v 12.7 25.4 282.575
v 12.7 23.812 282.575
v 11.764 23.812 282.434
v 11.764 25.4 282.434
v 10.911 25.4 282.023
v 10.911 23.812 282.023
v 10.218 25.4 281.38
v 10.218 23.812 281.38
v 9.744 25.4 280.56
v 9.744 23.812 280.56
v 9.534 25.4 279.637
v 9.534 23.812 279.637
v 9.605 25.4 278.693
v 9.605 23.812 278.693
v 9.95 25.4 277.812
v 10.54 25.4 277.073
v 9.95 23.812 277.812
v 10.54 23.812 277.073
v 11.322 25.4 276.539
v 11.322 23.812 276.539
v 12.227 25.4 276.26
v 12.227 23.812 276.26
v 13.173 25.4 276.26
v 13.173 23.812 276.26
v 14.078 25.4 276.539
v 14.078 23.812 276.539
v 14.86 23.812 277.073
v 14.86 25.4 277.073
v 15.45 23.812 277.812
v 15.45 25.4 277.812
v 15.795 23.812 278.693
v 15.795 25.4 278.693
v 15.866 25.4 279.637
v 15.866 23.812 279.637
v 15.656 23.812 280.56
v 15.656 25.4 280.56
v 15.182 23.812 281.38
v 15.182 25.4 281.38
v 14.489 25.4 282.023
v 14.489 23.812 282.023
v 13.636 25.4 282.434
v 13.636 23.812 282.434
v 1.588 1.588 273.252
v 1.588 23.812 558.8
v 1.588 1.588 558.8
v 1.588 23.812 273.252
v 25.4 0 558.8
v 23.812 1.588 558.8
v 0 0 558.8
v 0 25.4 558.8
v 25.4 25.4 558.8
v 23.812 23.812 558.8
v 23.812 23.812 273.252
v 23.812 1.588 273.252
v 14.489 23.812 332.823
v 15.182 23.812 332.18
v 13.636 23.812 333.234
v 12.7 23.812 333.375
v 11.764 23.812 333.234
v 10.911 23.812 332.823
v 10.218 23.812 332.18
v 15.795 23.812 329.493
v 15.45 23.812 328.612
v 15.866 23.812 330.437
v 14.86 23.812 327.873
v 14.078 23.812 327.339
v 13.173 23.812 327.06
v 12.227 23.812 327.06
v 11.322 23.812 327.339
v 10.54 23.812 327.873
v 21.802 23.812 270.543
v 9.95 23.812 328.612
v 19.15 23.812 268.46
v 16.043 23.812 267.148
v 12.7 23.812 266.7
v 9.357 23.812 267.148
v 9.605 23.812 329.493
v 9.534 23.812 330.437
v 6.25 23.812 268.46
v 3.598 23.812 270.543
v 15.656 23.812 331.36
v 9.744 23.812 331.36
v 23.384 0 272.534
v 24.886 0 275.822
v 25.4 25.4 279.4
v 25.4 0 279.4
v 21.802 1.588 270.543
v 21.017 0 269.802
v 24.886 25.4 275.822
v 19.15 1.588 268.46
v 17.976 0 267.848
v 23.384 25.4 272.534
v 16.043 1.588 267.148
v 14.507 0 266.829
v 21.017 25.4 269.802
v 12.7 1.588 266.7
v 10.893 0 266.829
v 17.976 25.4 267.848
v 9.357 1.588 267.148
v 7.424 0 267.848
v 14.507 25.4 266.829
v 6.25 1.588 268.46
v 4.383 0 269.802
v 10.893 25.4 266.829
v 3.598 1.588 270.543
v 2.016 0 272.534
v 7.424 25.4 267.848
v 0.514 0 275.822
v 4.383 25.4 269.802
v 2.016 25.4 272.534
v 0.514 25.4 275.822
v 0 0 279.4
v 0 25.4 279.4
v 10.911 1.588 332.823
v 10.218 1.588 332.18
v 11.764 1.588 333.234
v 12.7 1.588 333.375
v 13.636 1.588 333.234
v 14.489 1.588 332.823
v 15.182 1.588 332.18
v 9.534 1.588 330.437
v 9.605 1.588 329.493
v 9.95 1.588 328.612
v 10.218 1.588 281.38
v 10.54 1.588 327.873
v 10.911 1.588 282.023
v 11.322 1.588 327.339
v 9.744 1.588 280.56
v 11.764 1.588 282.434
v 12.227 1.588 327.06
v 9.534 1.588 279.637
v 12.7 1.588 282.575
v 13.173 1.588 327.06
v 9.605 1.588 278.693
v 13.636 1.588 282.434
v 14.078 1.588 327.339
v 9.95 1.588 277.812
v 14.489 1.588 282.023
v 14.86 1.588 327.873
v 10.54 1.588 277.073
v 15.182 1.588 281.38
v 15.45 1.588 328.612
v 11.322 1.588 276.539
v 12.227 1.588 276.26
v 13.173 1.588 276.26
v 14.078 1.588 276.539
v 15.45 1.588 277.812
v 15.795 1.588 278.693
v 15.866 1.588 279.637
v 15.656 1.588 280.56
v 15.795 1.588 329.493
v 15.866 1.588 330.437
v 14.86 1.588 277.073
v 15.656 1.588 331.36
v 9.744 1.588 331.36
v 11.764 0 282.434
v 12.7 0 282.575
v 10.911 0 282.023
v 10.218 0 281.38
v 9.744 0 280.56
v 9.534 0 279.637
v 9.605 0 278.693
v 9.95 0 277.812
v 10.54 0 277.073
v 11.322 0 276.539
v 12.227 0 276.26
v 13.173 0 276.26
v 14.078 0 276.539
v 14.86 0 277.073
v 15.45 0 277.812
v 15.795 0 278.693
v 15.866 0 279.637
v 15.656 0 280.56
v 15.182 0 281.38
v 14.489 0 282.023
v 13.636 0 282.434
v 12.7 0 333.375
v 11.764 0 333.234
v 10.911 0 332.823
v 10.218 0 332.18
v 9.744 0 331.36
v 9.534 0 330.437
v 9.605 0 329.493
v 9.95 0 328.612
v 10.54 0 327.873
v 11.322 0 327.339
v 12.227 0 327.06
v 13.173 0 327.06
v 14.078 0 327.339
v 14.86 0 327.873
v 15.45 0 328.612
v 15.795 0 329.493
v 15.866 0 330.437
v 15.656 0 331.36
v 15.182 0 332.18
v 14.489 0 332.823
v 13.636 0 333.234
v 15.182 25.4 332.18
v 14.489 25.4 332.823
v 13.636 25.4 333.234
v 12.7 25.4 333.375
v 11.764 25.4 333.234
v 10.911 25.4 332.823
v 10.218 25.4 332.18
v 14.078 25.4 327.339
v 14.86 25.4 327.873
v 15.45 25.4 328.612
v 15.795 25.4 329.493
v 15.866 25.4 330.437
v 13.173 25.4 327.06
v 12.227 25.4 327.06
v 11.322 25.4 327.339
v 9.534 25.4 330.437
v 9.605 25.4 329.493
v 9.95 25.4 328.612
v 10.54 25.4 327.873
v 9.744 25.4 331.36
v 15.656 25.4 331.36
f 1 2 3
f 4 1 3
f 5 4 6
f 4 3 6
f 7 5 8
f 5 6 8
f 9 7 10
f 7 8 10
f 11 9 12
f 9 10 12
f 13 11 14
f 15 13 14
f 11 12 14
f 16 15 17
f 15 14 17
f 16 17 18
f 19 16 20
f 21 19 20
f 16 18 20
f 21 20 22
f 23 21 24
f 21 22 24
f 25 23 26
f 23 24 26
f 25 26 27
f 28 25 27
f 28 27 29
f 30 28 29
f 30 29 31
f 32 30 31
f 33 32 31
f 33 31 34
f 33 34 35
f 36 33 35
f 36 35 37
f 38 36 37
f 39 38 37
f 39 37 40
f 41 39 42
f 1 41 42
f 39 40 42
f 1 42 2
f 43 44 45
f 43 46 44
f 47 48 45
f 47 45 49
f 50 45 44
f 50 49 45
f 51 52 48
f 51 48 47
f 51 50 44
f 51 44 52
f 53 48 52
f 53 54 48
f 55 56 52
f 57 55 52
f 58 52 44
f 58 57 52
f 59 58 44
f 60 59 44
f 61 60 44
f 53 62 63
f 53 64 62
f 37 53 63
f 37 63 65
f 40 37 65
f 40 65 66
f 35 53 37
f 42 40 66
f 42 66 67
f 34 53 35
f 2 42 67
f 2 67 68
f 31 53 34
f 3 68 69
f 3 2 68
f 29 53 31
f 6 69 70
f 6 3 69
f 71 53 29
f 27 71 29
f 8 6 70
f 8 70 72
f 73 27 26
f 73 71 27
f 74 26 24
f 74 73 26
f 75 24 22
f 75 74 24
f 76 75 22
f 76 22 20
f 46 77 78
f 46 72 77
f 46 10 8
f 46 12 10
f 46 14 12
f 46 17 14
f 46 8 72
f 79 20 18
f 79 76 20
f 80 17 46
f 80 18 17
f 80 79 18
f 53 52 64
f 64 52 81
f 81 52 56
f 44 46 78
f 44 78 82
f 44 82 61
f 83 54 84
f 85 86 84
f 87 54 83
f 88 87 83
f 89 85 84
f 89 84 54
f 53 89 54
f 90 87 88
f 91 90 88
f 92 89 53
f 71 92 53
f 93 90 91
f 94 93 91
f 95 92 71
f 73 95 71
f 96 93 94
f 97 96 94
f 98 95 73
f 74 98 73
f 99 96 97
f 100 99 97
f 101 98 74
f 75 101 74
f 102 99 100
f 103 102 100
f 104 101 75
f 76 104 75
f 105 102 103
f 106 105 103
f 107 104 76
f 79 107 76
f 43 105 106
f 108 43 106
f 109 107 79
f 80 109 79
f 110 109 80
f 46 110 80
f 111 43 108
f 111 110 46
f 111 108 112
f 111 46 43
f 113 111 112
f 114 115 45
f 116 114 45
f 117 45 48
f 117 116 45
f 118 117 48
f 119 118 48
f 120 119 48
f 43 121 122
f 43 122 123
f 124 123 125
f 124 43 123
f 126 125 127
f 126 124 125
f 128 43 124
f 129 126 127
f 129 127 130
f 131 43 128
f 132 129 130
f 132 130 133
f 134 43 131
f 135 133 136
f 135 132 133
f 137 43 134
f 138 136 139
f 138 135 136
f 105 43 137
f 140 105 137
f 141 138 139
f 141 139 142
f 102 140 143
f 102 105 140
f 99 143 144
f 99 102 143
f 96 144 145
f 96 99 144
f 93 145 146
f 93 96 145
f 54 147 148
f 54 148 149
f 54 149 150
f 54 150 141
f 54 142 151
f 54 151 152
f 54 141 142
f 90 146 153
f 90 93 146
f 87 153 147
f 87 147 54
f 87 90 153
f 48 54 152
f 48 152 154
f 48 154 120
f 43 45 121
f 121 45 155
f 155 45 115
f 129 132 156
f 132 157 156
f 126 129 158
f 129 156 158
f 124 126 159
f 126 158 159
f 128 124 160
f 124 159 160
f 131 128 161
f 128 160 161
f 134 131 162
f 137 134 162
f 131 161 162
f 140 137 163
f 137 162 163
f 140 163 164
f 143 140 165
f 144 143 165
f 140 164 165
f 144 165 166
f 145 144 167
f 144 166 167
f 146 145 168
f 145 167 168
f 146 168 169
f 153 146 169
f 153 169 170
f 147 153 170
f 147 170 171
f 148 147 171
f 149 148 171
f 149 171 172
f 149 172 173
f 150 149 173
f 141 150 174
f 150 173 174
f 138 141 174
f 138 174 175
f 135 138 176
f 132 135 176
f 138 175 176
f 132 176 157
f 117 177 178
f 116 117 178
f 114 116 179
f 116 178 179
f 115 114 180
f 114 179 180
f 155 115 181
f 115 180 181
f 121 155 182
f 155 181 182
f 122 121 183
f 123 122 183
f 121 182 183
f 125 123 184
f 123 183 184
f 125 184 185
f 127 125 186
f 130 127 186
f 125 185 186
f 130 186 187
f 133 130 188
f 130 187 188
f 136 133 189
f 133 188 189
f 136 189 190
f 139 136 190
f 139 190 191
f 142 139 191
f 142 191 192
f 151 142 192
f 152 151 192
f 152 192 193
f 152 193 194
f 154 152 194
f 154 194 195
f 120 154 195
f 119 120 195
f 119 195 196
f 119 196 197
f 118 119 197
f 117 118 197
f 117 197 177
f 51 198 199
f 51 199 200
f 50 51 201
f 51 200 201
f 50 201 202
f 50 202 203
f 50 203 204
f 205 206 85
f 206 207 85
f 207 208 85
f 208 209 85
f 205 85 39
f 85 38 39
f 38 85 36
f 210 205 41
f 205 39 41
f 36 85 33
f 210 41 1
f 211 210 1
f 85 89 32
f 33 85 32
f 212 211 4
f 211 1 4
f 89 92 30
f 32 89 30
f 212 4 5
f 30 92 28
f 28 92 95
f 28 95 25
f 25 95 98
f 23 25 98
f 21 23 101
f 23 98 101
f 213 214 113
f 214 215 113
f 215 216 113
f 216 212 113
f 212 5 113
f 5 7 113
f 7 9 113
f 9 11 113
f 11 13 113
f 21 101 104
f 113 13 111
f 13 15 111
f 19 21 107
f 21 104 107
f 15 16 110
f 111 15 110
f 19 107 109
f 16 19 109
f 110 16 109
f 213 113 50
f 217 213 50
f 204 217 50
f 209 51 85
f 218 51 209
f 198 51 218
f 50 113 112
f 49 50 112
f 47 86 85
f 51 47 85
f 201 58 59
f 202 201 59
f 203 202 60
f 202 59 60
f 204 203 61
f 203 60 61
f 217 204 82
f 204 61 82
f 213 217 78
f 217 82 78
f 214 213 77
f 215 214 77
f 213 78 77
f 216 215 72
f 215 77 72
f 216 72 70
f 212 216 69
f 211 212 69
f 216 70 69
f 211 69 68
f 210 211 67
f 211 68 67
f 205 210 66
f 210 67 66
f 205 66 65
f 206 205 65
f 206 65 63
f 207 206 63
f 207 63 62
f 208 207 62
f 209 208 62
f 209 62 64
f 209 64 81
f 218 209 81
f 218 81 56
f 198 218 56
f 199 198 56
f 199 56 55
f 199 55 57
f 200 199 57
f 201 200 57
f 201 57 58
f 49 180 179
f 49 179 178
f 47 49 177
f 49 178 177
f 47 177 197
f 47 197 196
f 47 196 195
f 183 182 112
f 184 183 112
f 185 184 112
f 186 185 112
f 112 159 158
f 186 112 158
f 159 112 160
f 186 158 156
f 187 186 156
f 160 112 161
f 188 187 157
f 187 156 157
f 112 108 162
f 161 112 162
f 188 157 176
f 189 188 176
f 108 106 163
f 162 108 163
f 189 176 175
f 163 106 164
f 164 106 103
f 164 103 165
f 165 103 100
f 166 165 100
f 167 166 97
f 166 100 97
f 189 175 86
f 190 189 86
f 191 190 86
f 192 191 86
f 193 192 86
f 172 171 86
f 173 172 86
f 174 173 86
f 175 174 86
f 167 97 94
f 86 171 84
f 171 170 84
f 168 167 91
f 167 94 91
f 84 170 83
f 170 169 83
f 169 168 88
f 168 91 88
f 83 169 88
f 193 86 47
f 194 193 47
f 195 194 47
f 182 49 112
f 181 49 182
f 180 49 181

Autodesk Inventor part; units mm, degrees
ref_plane "YZ Plane" through (0, 0, 0) normal (1, 0, 0) x (0, 1, 0)
ref_plane "XZ Plane" through (0, 0, 0) normal (0, 1, 0) x (-1, 0, 0)
ref_plane "XY Plane" through (0, 0, 0) normal (0, 0, 1) x (1, 0, 0)
sketch "Sketch1" plane through (0, 0, 0) normal (0, 0, 1) x (1, 0, 0)
  line L0 (0, 0) -> (25.4, 0)
  line L1 (25.4, 0) -> (25.4, 25.4)
  line L2 (25.4, 25.4) -> (0, 25.4)
  line L3 (0, 25.4) -> (0, 0)
  line L4 (1.5875, 1.5875) -> (23.8125, 1.5875)
  line L5 (23.8125, 1.5875) -> (23.8125, 23.8125)
  line L6 (23.8125, 23.8125) -> (1.5875, 23.8125)
  line L7 (1.5875, 23.8125) -> (1.5875, 1.5875)
  dimension "d0" = 25.4
  dimension "d1" = 25.4
  dimension "d2" = 1.5875
extrude "Extrusion1" add sketch "Sketch1" along normal blind 558.8
sketch "Sketch3" plane through (0, 25.4, 0) normal (0, 1, 0) x (1, 0, 0)
  line L0 (25.4, 0) -> (0, 0) projected
  line L1 (0, 0) -> (0, -558.8) projected
  line L2 (25.4, -558.8) -> (0, -558.8) projected
  line L3 (25.4, 0) -> (25.4, -558.8) projected
  point P0 (0, 0)
  point P1 (12.7, -279.4)
  dimension "d15" = 279.4
  dimension "d16" = 558.8
  dimension "d17" = 12.7
hole "Hole2" at (12.7, 25.4, 279.4) direction (0, -1, 0) diameter 6.35 end through all clearance for "Flat Head Machine Screw (82)" size "1/4" standard "Ansi Unified Screw Threads"
sketch "Sketch5" plane through (0, 25.4, 0) normal (0, 1, 0) x (1, 0, 0)
  circle A0 centre (12.7, -279.4) radius 3.175 projected
  line L0 (12.7, -279.4) -> (-12.4758, -279.4)
  point P0 (12.7, -228.6)
  point P1 (12.7, -330.2)
  dimension "d25" = 101.6
hole "Hole3" at (12.7, 25.4, 228.6) at (12.7, 25.4, 330.2) direction (0, -1, 0) diameter 6.35 end through all
sketch "Sketch7" plane through (0, 25.4, 0) normal (0, 1, 0) x (1, 0, 0)
  line L0 (0, 0) -> (0, -558.8) projected
  line L1 (25.4, 0) -> (25.4, -558.8) projected
  line L2 (25.4, 0) -> (0, 0) projected
  line L3 (0, 0) -> (25.4, 0) projected
  line L4 (0, -279.4) -> (0, 0)
  line L5 (25.4, 0) -> (25.4, -279.4)
  line L6 (0, 0) -> (25.4, 0)
  arc A0 (25.4, -279.4) -> (0, -279.4) centre (12.7, -279.4) ccw
  dimension "d41" = 279.4
extrude "Extrusion3" cut sketch "Sketch7" against normal blind 25.4
equation "\"d15\" = 0.5 * d16"
properties part number "ScissorLiftBarTop" material "Aluminum 6061"
